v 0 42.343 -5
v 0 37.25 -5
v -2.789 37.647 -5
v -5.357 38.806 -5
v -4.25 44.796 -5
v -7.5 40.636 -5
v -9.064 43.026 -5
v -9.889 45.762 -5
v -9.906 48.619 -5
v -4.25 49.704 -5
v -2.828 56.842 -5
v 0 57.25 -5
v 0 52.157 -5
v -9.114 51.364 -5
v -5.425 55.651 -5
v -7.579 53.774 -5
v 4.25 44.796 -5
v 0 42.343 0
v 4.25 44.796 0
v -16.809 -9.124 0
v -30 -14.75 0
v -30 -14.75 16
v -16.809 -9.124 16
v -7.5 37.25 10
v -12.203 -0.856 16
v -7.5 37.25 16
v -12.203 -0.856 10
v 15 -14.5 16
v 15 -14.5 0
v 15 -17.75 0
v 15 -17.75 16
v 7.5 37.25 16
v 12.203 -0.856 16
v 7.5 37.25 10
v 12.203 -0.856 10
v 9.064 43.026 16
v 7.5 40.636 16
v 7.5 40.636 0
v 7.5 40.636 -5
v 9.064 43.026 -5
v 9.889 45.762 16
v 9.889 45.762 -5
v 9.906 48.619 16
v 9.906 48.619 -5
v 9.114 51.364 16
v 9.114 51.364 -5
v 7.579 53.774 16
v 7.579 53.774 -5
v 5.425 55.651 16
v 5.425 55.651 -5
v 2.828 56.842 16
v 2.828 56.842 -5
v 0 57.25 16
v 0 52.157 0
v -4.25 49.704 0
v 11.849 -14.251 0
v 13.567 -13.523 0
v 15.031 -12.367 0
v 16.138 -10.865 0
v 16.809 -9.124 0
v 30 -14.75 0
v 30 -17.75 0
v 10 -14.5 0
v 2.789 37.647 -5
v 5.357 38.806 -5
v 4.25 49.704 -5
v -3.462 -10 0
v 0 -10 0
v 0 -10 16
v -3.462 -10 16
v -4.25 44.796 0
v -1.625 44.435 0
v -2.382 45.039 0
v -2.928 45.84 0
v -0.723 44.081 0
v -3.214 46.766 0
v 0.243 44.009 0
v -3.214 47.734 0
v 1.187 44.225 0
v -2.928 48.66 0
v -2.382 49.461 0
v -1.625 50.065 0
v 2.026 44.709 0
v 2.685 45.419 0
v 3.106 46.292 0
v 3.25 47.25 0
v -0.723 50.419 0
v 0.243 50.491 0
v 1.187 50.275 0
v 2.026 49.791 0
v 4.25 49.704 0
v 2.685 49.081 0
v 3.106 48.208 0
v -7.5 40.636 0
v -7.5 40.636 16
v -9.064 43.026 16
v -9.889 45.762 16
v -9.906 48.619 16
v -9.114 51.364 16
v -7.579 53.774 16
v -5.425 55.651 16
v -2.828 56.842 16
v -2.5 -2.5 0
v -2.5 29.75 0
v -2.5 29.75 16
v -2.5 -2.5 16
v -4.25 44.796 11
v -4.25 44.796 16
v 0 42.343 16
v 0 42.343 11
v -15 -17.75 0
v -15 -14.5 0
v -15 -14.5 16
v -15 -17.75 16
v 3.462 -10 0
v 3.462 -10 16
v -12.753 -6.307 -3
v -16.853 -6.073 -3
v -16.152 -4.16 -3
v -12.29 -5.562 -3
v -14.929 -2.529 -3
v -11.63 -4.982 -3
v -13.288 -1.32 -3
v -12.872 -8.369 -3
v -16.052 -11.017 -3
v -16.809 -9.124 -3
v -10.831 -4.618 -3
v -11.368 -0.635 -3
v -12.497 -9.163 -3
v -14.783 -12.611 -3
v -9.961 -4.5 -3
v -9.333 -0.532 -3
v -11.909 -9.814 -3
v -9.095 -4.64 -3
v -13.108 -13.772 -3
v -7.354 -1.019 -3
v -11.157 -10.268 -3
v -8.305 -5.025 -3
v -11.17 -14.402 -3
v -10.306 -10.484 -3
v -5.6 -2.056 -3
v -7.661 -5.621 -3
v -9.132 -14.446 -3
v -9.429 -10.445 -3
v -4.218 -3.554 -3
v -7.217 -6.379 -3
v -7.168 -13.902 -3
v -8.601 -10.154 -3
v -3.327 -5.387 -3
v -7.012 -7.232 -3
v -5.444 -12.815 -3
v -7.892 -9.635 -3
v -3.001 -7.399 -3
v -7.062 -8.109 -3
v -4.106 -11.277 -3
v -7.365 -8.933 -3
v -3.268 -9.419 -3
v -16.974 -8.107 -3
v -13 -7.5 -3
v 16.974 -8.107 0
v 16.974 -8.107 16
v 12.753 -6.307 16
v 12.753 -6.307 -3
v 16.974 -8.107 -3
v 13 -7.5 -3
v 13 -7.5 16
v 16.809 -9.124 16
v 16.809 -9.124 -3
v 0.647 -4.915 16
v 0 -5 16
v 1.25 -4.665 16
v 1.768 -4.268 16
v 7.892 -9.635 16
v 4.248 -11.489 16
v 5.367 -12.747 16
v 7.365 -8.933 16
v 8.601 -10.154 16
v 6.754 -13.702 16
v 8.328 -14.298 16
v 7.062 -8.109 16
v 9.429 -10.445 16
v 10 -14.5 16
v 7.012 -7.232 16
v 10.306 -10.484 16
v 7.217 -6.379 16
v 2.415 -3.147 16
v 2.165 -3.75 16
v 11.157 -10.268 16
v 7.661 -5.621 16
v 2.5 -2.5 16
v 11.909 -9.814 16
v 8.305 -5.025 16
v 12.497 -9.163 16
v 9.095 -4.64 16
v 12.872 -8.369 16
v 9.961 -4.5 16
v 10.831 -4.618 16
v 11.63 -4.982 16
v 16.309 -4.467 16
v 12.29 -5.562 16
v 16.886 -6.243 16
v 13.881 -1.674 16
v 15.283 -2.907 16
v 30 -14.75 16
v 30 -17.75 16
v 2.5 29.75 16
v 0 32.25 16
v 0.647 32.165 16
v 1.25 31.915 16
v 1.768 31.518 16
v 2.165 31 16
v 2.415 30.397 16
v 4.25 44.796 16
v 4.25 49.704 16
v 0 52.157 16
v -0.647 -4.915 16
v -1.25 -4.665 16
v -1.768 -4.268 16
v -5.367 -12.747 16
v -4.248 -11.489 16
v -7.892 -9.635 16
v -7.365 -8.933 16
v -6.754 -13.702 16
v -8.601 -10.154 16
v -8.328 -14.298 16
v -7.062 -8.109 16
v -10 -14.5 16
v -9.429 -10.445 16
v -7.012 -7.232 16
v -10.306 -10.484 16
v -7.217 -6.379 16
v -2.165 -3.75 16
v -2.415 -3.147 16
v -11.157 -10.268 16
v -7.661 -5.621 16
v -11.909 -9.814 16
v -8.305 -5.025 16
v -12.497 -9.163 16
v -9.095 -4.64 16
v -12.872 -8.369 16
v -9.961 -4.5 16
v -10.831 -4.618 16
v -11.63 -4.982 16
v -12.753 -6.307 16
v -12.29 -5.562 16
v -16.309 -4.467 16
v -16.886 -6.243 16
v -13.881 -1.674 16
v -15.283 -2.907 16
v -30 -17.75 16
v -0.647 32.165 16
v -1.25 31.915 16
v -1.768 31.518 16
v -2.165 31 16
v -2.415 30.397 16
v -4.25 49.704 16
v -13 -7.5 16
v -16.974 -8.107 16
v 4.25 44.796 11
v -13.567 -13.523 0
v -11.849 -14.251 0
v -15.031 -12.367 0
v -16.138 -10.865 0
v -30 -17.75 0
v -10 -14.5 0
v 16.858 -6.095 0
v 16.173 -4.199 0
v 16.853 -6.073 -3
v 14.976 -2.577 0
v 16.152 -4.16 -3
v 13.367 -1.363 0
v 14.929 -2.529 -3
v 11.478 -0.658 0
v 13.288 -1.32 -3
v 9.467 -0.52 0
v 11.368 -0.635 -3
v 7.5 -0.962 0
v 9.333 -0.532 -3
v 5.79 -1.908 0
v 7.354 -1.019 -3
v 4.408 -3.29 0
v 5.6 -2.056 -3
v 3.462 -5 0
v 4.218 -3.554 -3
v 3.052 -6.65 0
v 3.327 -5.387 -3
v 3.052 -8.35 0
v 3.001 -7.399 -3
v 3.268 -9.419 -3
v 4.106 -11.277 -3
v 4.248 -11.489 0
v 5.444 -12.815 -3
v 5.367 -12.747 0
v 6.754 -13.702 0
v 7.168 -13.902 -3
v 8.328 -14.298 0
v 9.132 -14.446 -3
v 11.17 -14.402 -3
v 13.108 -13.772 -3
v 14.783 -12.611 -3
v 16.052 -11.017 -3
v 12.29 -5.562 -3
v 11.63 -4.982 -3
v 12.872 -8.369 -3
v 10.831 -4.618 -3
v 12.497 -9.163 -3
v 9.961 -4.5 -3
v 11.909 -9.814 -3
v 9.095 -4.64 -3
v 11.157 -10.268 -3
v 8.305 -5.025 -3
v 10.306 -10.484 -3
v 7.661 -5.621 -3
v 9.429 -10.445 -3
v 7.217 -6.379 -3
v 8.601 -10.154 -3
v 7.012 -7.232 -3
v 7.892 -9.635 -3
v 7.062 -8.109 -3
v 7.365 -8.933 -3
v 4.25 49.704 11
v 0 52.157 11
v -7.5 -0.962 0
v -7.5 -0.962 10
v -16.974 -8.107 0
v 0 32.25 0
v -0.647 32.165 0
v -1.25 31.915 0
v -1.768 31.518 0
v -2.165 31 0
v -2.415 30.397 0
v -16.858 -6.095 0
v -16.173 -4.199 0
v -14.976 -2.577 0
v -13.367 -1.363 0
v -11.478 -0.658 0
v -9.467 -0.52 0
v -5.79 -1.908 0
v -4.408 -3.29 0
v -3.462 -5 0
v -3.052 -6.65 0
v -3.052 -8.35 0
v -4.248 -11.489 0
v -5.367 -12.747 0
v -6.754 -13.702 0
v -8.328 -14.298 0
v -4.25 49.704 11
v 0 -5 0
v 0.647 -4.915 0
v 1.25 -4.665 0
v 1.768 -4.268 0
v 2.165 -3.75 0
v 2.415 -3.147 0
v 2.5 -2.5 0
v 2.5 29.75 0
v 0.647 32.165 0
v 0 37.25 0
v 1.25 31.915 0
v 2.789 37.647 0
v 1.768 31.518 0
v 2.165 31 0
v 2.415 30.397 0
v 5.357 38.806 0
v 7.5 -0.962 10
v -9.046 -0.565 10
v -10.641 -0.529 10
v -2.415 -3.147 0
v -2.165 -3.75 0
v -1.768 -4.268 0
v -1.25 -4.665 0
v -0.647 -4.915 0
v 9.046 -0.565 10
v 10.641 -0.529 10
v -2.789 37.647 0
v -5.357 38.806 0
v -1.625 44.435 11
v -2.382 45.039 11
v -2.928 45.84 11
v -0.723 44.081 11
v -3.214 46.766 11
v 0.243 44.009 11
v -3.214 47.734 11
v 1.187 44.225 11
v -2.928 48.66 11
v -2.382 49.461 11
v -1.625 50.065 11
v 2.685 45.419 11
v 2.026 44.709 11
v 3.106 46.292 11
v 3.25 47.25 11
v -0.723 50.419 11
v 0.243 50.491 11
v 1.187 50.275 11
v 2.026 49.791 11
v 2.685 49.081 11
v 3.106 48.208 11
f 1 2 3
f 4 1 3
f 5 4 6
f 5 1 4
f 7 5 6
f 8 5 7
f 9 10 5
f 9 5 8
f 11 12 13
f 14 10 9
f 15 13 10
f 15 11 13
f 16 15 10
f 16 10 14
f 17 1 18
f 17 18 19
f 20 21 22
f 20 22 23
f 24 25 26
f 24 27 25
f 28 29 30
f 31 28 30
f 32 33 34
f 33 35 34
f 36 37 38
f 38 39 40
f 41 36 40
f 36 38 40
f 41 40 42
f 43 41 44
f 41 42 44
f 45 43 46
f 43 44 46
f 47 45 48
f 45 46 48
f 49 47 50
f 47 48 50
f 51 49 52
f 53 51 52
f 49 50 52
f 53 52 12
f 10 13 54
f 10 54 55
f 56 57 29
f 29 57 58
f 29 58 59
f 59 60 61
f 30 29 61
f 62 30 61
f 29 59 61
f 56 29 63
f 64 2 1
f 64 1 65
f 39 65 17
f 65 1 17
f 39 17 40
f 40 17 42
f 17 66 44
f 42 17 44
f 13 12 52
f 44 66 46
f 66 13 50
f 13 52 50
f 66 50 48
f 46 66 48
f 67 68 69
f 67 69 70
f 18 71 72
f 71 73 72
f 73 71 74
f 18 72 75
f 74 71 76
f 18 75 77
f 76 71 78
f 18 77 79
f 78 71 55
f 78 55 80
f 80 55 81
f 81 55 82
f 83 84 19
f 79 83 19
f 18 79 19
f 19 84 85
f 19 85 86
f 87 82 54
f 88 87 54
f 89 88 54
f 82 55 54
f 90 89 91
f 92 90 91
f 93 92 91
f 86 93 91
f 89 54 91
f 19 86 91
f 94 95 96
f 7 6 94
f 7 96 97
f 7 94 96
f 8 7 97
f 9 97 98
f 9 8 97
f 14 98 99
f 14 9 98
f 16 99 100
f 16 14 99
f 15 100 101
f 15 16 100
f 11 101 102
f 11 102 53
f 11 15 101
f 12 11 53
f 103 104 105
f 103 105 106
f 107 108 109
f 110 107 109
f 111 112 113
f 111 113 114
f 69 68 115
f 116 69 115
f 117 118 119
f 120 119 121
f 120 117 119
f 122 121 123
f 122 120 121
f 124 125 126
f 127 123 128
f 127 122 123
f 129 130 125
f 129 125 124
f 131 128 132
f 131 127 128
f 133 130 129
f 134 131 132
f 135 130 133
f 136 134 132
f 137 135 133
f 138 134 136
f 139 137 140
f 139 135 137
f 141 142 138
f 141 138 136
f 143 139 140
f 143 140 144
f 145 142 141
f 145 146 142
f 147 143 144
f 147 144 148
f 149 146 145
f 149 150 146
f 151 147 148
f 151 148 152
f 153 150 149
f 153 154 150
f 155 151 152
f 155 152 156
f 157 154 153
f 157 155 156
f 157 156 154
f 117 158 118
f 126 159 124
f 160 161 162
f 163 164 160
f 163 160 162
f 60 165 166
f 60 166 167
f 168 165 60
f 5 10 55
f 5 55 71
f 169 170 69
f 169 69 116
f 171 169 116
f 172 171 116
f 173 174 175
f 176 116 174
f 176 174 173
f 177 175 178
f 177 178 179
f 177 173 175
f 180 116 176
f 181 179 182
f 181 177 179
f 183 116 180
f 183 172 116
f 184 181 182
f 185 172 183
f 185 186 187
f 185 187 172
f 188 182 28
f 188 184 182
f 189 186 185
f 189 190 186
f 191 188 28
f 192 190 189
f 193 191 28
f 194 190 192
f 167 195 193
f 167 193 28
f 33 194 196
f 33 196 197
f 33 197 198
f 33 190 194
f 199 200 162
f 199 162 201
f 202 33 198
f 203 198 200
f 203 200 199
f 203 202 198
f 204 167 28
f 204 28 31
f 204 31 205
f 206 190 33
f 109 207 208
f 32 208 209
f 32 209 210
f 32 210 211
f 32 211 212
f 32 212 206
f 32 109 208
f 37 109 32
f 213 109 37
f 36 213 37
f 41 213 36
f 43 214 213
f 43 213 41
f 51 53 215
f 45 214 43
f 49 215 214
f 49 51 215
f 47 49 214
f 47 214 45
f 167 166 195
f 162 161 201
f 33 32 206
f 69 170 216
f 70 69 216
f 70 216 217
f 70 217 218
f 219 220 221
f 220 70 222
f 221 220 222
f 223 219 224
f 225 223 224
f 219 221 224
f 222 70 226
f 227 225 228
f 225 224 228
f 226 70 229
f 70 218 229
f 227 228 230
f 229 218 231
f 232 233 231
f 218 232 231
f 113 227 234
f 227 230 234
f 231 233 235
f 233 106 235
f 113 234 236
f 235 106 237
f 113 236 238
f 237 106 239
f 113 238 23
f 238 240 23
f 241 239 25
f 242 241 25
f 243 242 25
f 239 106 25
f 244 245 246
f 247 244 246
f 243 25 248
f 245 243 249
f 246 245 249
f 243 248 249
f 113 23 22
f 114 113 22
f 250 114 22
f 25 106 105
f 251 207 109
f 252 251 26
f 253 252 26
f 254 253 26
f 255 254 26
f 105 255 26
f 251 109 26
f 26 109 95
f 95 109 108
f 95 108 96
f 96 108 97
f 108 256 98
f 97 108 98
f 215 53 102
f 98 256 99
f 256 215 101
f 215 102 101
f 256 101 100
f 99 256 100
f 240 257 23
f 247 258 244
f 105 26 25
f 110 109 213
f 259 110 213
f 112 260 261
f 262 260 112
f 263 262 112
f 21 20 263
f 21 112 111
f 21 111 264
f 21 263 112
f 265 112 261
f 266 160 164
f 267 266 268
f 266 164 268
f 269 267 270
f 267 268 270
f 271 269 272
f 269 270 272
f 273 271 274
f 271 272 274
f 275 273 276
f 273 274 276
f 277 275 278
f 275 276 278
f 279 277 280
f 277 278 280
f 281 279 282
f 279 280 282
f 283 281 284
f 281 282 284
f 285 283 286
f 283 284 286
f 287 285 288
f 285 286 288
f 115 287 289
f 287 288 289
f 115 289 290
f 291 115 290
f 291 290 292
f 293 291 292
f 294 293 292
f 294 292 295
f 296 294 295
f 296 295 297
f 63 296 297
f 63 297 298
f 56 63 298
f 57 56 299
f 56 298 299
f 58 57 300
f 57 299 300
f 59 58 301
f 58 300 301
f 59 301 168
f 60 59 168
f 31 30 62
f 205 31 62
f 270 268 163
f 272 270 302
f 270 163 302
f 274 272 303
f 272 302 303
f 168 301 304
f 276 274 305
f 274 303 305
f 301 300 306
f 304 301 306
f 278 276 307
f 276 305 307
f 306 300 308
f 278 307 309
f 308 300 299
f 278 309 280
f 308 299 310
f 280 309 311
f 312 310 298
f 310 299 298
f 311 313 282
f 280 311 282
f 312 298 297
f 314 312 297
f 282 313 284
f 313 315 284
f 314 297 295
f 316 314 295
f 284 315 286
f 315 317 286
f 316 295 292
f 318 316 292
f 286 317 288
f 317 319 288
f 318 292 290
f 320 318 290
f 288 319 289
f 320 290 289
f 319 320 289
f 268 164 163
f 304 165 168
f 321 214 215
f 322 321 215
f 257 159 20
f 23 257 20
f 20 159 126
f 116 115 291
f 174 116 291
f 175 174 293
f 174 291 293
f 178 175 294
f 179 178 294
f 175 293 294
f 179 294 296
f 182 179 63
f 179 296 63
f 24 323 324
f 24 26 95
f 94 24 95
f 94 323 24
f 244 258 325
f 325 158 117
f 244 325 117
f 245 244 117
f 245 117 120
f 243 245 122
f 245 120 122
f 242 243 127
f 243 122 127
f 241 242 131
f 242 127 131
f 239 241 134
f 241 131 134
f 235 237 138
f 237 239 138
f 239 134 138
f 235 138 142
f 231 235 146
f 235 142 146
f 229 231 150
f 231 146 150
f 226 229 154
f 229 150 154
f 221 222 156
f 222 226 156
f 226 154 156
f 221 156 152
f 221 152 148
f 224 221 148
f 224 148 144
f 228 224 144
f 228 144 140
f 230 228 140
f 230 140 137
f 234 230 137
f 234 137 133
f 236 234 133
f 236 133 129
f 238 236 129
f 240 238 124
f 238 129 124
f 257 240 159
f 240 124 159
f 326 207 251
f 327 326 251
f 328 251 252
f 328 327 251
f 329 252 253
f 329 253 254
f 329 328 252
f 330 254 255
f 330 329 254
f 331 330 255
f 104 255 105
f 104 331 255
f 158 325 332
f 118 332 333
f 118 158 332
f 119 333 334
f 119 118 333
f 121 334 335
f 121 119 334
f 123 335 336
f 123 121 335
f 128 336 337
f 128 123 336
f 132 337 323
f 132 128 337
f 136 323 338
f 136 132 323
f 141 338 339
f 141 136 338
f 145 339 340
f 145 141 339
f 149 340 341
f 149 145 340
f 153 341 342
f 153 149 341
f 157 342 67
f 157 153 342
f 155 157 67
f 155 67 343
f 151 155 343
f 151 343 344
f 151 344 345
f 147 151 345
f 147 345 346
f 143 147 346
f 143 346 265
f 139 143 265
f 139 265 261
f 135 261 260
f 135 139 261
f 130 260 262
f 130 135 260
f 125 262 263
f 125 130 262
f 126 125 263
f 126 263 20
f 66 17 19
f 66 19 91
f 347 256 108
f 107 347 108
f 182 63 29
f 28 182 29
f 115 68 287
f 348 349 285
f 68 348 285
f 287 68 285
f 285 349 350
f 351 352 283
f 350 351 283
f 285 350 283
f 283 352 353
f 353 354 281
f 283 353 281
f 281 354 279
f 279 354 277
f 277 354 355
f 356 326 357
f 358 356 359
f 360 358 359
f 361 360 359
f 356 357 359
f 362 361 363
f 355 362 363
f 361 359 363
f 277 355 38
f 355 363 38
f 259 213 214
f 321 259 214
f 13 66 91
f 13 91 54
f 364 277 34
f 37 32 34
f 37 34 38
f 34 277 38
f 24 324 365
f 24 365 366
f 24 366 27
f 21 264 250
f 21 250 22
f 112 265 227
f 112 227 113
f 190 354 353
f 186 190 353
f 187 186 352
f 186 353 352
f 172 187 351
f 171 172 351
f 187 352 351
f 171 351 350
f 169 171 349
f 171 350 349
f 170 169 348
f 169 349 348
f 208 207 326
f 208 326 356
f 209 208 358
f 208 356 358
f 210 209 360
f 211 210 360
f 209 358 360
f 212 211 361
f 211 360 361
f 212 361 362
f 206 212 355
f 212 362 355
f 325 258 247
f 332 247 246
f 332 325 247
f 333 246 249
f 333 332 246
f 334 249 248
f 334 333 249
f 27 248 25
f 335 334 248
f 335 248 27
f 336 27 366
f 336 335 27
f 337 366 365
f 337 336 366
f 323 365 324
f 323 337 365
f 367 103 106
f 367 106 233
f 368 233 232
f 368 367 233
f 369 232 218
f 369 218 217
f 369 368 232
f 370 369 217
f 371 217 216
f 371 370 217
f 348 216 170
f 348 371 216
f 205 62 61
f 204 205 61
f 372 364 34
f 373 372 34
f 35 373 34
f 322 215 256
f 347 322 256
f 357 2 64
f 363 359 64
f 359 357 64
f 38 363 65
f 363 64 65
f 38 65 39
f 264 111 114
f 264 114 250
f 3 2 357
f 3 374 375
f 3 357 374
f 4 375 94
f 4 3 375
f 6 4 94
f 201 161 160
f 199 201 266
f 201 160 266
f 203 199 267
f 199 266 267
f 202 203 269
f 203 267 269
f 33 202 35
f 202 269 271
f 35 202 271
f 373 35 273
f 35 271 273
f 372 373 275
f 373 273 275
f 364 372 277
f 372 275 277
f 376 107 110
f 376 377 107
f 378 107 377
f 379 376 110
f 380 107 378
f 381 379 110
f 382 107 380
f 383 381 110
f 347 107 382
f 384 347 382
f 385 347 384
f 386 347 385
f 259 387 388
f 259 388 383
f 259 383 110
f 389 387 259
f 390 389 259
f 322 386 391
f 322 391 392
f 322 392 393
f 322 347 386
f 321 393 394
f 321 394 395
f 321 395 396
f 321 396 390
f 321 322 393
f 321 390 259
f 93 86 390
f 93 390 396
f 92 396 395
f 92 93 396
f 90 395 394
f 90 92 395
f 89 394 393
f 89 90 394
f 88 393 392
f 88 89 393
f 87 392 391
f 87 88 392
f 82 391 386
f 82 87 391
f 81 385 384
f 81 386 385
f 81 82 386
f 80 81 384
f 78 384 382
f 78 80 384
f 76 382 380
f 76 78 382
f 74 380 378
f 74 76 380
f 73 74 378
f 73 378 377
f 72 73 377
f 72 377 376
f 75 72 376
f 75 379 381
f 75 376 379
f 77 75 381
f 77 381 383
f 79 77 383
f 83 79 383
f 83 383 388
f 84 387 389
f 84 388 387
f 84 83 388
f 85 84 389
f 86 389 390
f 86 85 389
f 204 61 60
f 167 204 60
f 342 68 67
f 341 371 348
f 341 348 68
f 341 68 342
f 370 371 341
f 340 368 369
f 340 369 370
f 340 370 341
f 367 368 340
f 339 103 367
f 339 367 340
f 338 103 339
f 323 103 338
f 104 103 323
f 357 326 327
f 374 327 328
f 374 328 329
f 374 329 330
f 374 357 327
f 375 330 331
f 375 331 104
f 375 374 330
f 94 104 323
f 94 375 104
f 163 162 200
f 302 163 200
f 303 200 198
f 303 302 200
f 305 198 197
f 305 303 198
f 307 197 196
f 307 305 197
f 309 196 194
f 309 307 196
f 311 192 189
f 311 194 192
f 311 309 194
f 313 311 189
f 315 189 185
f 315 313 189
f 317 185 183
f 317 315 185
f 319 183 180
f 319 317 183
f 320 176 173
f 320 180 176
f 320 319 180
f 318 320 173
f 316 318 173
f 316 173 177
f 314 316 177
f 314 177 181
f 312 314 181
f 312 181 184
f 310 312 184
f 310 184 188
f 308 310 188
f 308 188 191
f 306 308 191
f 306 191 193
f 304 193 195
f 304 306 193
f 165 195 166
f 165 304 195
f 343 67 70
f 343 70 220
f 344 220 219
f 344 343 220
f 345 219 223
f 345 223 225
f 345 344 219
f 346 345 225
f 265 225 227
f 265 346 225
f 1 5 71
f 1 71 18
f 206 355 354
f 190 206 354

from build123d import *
from build123d.topology import SkipClean

# Parameters (mm, degrees)
SKETCH1_R               = 7
BOSS_EXTRUDE1_DEPTH     = 16
BOSS_EXTRUDE2_START     = -3
SKETCH3_R               = 7
BOSS_EXTRUDE2_DEPTH     = 3
CUT_EXTRUDE1_DEPTH      = 39.354433
CUT_EXTRUDE1_DEPTH_BACK = 39.354433
SKETCH2_R               = 3
BOSS_EXTRUDE3_START     = -6
BOSS_EXTRUDE3_DEPTH     = 6
BOSS_EXTRUDE4_START     = -16
BOSS_EXTRUDE4_DEPTH     = 16
BOSS_EXTRUDE5_START     = -21
BOSS_EXTRUDE5_DEPTH     = 21
CUT_EXTRUDE2_DEPTH      = 5
CUT_EXTRUDE3_START      = -21
CUT_EXTRUDE3_DEPTH      = 5
CUT_EXTRUDE4_DEPTH      = 67.585002
CUT_EXTRUDE4_DEPTH_BACK = 67.585002
SKETCH6_R               = 3.25


with BuildPart() as part:
    # Sketch1 → Boss-Extrude1 (new body)
    with BuildSketch(Plane.XY):
        with BuildLine():
            ThreePointArc((16.808917, -9.124391), (14.337584, -12.994121), (10, -14.5))
            Line((10, -14.5), (15, -14.5))
            Line((15, -14.5), (15, -17.75))
            Line((15, -17.75), (30, -17.75))
            Line((30, -17.75), (30, -14.75))
            Line((30, -14.75), (16.808917, -9.124391))
        make_face()
        with Locations((10, -7.5)):
            Circle(SKETCH1_R)
        with BuildLine():
            Line((0, -10), (3.461652, -10))
            ThreePointArc((3.461652, -10), (3, -7.5), (3.461652, -5))
            Line((3.461652, -5), (0, -5))
            Line((0, -5), (0, -10))
        make_face()
    extrude(amount=BOSS_EXTRUDE1_DEPTH)

    # Sketch3 → Boss-Extrude2 (add)
    with BuildSketch(Plane.XY.offset(BOSS_EXTRUDE2_START)):
        with Locations(Location((10, -7.5, 0), (0, 0, 159.075168))):
            Circle(SKETCH3_R)
    extrude(amount=BOSS_EXTRUDE2_DEPTH)

    # Sketch2 → Cut-Extrude1 (cut, two sides: drawn at the far end of the back side and taken through both)
    with BuildSketch(Plane.XY.offset(-CUT_EXTRUDE1_DEPTH_BACK)):
        with Locations((10, -7.5)):
            Circle(SKETCH2_R)
        with BuildLine():
            ThreePointArc((12.752773, -6.307423), (12.937543, -6.891034), (13, -7.5))
            Line((13, -7.5), (16.959704, -9.188697))
            Line((16.959704, -9.188697), (17.35199, -8.268854))
            Line((17.35199, -8.268854), (12.752773, -6.307423))
        make_face()
    extrude(amount=CUT_EXTRUDE1_DEPTH + CUT_EXTRUDE1_DEPTH_BACK, mode=Mode.SUBTRACT)

    # Sketch4 → Boss-Extrude3 (add)
    with BuildSketch(Plane.XY.offset(16).offset(BOSS_EXTRUDE3_START)):
        with BuildLine():
            Line((12.202752, -0.855613), (7.5, 37.25))
            Line((7.5, 37.25), (7.5, -0.961652))
            ThreePointArc((7.5, -0.961652), (9.842202, -0.501779), (12.202752, -0.855613))
        make_face()
    extrude(amount=BOSS_EXTRUDE3_DEPTH)

    # Sketch4<6> → Boss-Extrude4 (add)
    with BuildSketch(Plane.XY.offset(16).offset(BOSS_EXTRUDE4_START)):
        with BuildLine():
            Line((7.5, 37.25), (7.5, 40.635622))
            ThreePointArc((7.5, 40.635622), (4.114378, 38.135622), (0, 37.25))
            Line((0, 37.25), (0, 32.25))
            ThreePointArc((0, 32.25), (1.767767, 31.517767), (2.5, 29.75))
            Line((2.5, 29.75), (2.5, -2.5))
            ThreePointArc((2.5, -2.5), (1.767767, -4.267767), (0, -5))
            Line((0, -5), (3.461652, -5))
            ThreePointArc((3.461652, -5), (5.050253, -2.550253), (7.5, -0.961652))
            Line((7.5, -0.961652), (7.5, 37.25))
        make_face()
    extrude(amount=BOSS_EXTRUDE4_DEPTH)

    # Sketch4<7> → Boss-Extrude5 (add)
    with BuildSketch(Plane.XY.offset(16).offset(BOSS_EXTRUDE5_START)):
        with BuildLine():
            ThreePointArc((0, 37.25), (4.114378, 38.135622), (7.5, 40.635622))
            ThreePointArc((7.5, 40.635622), (9.114378, 51.364378), (0, 57.25))
            Line((0, 57.25), (0, 49.65))
            ThreePointArc((0, 49.65), (2.4, 47.25), (0, 44.85))
            Line((0, 44.85), (0, 37.25))
        make_face()
    extrude(amount=BOSS_EXTRUDE5_DEPTH)

    # Mirror1: part across plane


with BuildPart() as part_1:
    with SkipClean():  # the faces are left unmerged after this step: merging them gives an invalid solid
        add(part.part)
        add(part.part.mirror(Plane(origin=(0, 0, 0), x_dir=(0, 0, 1), z_dir=(1, 0, 0))))

    # Sketch5 → Cut-Extrude2 (cut)
    with SkipClean():  # the faces are left unmerged after this step: merging them gives an invalid solid
        with BuildSketch(Plane.XY.offset(16)):
            Polygon((4.25, 49.703739), (0, 52.157477), (-4.25, 49.703739), (-4.25, 44.796261), (0, 42.342523), (4.25, 44.796261), align=None)
        extrude(amount=-CUT_EXTRUDE2_DEPTH, mode=Mode.SUBTRACT)

    # Sketch5<2> → Cut-Extrude3 (cut)
    with SkipClean():  # the faces are left unmerged after this step: merging them gives an invalid solid
        with BuildSketch(Plane.XY.offset(16).offset(CUT_EXTRUDE3_START)):
            Polygon((4.25, 49.703739), (0, 52.157477), (-4.25, 49.703739), (-4.25, 44.796261), (0, 42.342523), (4.25, 44.796261), align=None)
        extrude(amount=CUT_EXTRUDE3_DEPTH, mode=Mode.SUBTRACT)

    # Sketch6 → Cut-Extrude4 (cut, two sides: drawn at the far end of the back side and taken through both)
    with SkipClean():  # the faces are left unmerged after this step: merging them gives an invalid solid
        with BuildSketch(Plane.XY.offset(11).offset(-CUT_EXTRUDE4_DEPTH_BACK)):
            with Locations((0, 47.25)):
                Circle(SKETCH6_R)
        extrude(amount=CUT_EXTRUDE4_DEPTH + CUT_EXTRUDE4_DEPTH_BACK, mode=Mode.SUBTRACT)


solid = part_1.part
